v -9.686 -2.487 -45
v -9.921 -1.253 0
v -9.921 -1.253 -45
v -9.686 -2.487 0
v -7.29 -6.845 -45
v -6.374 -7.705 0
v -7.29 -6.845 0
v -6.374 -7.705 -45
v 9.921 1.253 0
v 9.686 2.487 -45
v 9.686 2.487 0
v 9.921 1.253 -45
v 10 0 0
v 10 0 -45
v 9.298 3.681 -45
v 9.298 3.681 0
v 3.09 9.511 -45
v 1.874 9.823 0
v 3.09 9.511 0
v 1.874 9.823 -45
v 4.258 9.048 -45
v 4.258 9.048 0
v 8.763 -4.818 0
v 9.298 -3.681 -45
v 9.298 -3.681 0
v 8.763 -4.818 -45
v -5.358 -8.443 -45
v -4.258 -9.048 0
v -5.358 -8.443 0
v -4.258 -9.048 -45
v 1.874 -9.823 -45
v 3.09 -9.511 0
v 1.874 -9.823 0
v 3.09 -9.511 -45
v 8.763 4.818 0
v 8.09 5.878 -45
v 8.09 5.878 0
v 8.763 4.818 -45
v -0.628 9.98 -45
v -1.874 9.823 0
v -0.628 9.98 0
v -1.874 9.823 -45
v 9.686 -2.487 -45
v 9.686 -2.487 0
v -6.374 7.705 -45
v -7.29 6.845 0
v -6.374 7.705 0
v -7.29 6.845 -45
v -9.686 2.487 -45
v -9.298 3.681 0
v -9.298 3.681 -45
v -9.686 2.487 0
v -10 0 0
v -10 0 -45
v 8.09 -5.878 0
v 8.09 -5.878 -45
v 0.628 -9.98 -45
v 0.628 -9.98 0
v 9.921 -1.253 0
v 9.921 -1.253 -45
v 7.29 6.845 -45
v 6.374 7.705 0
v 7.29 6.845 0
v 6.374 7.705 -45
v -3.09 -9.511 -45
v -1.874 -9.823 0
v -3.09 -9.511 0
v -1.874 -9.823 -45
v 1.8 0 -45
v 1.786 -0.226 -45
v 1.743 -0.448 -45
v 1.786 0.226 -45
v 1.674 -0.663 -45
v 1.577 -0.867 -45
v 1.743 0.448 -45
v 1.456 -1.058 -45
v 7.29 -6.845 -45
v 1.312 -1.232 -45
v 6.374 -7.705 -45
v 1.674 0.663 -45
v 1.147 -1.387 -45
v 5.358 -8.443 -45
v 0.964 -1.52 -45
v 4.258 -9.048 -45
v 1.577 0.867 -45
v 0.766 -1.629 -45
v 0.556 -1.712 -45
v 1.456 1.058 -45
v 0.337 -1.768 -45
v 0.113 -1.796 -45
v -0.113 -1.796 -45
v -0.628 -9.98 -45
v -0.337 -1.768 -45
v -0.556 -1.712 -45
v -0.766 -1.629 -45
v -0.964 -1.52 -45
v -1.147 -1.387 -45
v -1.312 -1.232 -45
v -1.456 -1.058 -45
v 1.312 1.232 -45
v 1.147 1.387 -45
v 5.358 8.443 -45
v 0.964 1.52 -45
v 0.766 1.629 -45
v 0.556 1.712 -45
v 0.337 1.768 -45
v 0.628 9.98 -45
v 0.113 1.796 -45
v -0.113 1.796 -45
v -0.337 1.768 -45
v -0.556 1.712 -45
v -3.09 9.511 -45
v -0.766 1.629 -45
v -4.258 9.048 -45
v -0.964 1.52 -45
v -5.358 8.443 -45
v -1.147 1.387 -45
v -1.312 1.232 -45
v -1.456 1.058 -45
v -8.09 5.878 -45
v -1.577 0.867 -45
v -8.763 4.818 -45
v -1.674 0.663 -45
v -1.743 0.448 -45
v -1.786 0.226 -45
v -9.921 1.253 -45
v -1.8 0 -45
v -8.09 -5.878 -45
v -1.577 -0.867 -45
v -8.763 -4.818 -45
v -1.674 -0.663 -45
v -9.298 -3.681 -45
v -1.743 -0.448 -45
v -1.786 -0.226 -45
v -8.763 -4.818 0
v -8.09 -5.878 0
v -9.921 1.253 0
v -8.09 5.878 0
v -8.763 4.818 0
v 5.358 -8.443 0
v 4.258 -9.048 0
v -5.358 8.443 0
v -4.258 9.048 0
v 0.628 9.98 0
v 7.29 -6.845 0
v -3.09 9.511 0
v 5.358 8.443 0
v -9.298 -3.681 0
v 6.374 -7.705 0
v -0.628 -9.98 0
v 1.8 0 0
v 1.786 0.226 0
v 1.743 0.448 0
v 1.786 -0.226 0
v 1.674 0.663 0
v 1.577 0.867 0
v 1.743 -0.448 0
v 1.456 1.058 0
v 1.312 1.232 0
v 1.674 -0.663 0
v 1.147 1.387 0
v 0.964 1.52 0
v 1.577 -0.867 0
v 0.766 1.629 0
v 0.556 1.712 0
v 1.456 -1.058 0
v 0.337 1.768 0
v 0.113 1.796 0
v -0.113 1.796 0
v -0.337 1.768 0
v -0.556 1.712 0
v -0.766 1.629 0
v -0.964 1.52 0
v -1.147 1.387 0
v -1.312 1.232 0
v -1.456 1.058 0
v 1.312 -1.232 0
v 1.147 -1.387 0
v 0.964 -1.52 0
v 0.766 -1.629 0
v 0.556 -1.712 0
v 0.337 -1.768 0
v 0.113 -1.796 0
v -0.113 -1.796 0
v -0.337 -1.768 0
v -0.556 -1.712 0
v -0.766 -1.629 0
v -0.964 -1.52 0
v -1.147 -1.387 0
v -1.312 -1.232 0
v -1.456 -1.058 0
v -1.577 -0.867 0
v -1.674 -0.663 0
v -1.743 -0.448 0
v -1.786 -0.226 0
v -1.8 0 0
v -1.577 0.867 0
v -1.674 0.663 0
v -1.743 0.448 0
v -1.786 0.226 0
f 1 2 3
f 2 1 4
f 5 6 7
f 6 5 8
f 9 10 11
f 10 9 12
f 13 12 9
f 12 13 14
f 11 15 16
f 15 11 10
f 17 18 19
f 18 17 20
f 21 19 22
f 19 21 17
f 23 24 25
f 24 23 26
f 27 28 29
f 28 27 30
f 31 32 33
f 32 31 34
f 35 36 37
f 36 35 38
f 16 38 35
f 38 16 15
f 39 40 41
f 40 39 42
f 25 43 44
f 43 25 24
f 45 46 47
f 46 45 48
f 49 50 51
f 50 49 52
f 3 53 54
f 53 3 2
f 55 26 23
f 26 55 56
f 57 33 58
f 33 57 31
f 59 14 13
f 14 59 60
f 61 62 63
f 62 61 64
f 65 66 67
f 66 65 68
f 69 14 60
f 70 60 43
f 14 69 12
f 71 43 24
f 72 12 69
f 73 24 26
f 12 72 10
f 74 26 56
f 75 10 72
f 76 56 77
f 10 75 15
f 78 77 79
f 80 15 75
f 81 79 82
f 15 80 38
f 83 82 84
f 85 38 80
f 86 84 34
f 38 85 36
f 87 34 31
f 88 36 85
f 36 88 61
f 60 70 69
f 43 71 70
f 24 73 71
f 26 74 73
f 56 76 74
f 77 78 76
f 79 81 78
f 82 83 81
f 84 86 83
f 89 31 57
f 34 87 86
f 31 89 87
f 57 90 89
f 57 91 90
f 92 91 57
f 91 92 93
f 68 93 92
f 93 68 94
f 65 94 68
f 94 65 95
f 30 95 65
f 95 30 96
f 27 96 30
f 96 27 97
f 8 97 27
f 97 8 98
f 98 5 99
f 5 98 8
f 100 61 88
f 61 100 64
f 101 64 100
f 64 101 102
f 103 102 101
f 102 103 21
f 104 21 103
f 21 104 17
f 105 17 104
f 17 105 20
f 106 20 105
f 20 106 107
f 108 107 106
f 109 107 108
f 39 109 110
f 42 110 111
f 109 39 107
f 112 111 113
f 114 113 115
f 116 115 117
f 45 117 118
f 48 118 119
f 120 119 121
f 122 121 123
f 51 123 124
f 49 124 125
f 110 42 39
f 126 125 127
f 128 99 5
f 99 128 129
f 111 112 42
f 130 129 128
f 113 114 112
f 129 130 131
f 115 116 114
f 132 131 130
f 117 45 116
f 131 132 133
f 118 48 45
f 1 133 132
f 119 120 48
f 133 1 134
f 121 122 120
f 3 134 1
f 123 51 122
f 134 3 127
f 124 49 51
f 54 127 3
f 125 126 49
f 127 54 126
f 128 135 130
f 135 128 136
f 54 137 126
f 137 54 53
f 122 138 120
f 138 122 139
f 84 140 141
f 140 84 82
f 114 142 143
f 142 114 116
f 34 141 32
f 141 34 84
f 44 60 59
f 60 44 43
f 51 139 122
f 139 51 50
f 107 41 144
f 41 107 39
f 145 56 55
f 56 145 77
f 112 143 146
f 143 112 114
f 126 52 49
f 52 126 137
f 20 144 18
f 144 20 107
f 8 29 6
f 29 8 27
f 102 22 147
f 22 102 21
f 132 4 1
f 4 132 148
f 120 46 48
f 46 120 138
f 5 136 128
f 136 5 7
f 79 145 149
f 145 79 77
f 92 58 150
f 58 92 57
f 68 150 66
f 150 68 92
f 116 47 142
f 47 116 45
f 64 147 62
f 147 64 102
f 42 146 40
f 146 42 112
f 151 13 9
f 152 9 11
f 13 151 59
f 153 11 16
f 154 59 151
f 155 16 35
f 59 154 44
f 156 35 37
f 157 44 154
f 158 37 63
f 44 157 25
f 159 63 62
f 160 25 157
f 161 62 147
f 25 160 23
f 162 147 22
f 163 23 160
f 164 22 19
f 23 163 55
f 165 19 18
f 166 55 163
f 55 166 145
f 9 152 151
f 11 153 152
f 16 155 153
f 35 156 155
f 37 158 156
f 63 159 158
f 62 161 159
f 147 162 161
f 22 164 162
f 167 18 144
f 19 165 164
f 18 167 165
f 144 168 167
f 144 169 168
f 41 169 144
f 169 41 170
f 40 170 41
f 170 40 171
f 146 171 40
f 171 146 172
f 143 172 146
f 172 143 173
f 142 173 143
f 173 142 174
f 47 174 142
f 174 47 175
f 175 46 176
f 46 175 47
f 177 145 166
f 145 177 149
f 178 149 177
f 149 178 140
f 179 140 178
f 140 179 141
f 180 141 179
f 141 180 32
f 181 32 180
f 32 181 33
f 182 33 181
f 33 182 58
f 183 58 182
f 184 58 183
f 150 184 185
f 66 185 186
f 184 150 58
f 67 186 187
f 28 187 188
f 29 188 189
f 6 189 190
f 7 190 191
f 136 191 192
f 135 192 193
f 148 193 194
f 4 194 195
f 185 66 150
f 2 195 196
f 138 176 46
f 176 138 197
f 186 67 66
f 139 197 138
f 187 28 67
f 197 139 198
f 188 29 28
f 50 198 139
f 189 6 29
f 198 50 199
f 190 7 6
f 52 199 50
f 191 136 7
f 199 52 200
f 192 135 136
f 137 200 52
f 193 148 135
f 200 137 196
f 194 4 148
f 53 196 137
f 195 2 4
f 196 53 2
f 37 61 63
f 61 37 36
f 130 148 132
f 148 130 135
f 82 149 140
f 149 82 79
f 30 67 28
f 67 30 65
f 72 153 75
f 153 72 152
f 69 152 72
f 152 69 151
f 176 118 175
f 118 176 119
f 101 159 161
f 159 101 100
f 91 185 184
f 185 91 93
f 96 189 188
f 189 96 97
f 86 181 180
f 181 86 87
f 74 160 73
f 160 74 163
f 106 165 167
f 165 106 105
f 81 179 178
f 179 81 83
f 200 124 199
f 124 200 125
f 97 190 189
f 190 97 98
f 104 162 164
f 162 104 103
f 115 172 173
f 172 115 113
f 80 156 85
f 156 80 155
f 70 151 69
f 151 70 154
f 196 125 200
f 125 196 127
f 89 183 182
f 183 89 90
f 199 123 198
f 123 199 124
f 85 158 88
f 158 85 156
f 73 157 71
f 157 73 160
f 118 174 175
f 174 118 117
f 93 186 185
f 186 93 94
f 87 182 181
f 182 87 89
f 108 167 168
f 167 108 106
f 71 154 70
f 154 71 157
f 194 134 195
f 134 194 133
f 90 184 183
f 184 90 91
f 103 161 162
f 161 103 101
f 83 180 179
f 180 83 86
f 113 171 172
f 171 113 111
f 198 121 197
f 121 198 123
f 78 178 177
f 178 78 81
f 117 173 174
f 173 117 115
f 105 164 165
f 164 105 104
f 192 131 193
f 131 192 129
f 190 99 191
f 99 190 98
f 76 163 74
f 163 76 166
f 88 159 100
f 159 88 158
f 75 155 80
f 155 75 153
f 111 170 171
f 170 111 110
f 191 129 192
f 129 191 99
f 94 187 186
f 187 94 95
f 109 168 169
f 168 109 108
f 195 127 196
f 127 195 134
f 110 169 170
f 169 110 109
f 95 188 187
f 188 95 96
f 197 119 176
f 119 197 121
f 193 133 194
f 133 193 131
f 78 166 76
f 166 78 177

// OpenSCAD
$fn = 50;


difference() {
	union() {
		translate(v = [0, 0, -45.0000000000]) {
			cylinder(h = 45, r = 10.0000000000);
		}
		cylinder(h = 0, r = 16.0000000000);
	}
	union() {
		#translate(v = [0, 0, -45]) {
			cylinder(h = 45, r = 1.8000000000);
		}
	}
}
